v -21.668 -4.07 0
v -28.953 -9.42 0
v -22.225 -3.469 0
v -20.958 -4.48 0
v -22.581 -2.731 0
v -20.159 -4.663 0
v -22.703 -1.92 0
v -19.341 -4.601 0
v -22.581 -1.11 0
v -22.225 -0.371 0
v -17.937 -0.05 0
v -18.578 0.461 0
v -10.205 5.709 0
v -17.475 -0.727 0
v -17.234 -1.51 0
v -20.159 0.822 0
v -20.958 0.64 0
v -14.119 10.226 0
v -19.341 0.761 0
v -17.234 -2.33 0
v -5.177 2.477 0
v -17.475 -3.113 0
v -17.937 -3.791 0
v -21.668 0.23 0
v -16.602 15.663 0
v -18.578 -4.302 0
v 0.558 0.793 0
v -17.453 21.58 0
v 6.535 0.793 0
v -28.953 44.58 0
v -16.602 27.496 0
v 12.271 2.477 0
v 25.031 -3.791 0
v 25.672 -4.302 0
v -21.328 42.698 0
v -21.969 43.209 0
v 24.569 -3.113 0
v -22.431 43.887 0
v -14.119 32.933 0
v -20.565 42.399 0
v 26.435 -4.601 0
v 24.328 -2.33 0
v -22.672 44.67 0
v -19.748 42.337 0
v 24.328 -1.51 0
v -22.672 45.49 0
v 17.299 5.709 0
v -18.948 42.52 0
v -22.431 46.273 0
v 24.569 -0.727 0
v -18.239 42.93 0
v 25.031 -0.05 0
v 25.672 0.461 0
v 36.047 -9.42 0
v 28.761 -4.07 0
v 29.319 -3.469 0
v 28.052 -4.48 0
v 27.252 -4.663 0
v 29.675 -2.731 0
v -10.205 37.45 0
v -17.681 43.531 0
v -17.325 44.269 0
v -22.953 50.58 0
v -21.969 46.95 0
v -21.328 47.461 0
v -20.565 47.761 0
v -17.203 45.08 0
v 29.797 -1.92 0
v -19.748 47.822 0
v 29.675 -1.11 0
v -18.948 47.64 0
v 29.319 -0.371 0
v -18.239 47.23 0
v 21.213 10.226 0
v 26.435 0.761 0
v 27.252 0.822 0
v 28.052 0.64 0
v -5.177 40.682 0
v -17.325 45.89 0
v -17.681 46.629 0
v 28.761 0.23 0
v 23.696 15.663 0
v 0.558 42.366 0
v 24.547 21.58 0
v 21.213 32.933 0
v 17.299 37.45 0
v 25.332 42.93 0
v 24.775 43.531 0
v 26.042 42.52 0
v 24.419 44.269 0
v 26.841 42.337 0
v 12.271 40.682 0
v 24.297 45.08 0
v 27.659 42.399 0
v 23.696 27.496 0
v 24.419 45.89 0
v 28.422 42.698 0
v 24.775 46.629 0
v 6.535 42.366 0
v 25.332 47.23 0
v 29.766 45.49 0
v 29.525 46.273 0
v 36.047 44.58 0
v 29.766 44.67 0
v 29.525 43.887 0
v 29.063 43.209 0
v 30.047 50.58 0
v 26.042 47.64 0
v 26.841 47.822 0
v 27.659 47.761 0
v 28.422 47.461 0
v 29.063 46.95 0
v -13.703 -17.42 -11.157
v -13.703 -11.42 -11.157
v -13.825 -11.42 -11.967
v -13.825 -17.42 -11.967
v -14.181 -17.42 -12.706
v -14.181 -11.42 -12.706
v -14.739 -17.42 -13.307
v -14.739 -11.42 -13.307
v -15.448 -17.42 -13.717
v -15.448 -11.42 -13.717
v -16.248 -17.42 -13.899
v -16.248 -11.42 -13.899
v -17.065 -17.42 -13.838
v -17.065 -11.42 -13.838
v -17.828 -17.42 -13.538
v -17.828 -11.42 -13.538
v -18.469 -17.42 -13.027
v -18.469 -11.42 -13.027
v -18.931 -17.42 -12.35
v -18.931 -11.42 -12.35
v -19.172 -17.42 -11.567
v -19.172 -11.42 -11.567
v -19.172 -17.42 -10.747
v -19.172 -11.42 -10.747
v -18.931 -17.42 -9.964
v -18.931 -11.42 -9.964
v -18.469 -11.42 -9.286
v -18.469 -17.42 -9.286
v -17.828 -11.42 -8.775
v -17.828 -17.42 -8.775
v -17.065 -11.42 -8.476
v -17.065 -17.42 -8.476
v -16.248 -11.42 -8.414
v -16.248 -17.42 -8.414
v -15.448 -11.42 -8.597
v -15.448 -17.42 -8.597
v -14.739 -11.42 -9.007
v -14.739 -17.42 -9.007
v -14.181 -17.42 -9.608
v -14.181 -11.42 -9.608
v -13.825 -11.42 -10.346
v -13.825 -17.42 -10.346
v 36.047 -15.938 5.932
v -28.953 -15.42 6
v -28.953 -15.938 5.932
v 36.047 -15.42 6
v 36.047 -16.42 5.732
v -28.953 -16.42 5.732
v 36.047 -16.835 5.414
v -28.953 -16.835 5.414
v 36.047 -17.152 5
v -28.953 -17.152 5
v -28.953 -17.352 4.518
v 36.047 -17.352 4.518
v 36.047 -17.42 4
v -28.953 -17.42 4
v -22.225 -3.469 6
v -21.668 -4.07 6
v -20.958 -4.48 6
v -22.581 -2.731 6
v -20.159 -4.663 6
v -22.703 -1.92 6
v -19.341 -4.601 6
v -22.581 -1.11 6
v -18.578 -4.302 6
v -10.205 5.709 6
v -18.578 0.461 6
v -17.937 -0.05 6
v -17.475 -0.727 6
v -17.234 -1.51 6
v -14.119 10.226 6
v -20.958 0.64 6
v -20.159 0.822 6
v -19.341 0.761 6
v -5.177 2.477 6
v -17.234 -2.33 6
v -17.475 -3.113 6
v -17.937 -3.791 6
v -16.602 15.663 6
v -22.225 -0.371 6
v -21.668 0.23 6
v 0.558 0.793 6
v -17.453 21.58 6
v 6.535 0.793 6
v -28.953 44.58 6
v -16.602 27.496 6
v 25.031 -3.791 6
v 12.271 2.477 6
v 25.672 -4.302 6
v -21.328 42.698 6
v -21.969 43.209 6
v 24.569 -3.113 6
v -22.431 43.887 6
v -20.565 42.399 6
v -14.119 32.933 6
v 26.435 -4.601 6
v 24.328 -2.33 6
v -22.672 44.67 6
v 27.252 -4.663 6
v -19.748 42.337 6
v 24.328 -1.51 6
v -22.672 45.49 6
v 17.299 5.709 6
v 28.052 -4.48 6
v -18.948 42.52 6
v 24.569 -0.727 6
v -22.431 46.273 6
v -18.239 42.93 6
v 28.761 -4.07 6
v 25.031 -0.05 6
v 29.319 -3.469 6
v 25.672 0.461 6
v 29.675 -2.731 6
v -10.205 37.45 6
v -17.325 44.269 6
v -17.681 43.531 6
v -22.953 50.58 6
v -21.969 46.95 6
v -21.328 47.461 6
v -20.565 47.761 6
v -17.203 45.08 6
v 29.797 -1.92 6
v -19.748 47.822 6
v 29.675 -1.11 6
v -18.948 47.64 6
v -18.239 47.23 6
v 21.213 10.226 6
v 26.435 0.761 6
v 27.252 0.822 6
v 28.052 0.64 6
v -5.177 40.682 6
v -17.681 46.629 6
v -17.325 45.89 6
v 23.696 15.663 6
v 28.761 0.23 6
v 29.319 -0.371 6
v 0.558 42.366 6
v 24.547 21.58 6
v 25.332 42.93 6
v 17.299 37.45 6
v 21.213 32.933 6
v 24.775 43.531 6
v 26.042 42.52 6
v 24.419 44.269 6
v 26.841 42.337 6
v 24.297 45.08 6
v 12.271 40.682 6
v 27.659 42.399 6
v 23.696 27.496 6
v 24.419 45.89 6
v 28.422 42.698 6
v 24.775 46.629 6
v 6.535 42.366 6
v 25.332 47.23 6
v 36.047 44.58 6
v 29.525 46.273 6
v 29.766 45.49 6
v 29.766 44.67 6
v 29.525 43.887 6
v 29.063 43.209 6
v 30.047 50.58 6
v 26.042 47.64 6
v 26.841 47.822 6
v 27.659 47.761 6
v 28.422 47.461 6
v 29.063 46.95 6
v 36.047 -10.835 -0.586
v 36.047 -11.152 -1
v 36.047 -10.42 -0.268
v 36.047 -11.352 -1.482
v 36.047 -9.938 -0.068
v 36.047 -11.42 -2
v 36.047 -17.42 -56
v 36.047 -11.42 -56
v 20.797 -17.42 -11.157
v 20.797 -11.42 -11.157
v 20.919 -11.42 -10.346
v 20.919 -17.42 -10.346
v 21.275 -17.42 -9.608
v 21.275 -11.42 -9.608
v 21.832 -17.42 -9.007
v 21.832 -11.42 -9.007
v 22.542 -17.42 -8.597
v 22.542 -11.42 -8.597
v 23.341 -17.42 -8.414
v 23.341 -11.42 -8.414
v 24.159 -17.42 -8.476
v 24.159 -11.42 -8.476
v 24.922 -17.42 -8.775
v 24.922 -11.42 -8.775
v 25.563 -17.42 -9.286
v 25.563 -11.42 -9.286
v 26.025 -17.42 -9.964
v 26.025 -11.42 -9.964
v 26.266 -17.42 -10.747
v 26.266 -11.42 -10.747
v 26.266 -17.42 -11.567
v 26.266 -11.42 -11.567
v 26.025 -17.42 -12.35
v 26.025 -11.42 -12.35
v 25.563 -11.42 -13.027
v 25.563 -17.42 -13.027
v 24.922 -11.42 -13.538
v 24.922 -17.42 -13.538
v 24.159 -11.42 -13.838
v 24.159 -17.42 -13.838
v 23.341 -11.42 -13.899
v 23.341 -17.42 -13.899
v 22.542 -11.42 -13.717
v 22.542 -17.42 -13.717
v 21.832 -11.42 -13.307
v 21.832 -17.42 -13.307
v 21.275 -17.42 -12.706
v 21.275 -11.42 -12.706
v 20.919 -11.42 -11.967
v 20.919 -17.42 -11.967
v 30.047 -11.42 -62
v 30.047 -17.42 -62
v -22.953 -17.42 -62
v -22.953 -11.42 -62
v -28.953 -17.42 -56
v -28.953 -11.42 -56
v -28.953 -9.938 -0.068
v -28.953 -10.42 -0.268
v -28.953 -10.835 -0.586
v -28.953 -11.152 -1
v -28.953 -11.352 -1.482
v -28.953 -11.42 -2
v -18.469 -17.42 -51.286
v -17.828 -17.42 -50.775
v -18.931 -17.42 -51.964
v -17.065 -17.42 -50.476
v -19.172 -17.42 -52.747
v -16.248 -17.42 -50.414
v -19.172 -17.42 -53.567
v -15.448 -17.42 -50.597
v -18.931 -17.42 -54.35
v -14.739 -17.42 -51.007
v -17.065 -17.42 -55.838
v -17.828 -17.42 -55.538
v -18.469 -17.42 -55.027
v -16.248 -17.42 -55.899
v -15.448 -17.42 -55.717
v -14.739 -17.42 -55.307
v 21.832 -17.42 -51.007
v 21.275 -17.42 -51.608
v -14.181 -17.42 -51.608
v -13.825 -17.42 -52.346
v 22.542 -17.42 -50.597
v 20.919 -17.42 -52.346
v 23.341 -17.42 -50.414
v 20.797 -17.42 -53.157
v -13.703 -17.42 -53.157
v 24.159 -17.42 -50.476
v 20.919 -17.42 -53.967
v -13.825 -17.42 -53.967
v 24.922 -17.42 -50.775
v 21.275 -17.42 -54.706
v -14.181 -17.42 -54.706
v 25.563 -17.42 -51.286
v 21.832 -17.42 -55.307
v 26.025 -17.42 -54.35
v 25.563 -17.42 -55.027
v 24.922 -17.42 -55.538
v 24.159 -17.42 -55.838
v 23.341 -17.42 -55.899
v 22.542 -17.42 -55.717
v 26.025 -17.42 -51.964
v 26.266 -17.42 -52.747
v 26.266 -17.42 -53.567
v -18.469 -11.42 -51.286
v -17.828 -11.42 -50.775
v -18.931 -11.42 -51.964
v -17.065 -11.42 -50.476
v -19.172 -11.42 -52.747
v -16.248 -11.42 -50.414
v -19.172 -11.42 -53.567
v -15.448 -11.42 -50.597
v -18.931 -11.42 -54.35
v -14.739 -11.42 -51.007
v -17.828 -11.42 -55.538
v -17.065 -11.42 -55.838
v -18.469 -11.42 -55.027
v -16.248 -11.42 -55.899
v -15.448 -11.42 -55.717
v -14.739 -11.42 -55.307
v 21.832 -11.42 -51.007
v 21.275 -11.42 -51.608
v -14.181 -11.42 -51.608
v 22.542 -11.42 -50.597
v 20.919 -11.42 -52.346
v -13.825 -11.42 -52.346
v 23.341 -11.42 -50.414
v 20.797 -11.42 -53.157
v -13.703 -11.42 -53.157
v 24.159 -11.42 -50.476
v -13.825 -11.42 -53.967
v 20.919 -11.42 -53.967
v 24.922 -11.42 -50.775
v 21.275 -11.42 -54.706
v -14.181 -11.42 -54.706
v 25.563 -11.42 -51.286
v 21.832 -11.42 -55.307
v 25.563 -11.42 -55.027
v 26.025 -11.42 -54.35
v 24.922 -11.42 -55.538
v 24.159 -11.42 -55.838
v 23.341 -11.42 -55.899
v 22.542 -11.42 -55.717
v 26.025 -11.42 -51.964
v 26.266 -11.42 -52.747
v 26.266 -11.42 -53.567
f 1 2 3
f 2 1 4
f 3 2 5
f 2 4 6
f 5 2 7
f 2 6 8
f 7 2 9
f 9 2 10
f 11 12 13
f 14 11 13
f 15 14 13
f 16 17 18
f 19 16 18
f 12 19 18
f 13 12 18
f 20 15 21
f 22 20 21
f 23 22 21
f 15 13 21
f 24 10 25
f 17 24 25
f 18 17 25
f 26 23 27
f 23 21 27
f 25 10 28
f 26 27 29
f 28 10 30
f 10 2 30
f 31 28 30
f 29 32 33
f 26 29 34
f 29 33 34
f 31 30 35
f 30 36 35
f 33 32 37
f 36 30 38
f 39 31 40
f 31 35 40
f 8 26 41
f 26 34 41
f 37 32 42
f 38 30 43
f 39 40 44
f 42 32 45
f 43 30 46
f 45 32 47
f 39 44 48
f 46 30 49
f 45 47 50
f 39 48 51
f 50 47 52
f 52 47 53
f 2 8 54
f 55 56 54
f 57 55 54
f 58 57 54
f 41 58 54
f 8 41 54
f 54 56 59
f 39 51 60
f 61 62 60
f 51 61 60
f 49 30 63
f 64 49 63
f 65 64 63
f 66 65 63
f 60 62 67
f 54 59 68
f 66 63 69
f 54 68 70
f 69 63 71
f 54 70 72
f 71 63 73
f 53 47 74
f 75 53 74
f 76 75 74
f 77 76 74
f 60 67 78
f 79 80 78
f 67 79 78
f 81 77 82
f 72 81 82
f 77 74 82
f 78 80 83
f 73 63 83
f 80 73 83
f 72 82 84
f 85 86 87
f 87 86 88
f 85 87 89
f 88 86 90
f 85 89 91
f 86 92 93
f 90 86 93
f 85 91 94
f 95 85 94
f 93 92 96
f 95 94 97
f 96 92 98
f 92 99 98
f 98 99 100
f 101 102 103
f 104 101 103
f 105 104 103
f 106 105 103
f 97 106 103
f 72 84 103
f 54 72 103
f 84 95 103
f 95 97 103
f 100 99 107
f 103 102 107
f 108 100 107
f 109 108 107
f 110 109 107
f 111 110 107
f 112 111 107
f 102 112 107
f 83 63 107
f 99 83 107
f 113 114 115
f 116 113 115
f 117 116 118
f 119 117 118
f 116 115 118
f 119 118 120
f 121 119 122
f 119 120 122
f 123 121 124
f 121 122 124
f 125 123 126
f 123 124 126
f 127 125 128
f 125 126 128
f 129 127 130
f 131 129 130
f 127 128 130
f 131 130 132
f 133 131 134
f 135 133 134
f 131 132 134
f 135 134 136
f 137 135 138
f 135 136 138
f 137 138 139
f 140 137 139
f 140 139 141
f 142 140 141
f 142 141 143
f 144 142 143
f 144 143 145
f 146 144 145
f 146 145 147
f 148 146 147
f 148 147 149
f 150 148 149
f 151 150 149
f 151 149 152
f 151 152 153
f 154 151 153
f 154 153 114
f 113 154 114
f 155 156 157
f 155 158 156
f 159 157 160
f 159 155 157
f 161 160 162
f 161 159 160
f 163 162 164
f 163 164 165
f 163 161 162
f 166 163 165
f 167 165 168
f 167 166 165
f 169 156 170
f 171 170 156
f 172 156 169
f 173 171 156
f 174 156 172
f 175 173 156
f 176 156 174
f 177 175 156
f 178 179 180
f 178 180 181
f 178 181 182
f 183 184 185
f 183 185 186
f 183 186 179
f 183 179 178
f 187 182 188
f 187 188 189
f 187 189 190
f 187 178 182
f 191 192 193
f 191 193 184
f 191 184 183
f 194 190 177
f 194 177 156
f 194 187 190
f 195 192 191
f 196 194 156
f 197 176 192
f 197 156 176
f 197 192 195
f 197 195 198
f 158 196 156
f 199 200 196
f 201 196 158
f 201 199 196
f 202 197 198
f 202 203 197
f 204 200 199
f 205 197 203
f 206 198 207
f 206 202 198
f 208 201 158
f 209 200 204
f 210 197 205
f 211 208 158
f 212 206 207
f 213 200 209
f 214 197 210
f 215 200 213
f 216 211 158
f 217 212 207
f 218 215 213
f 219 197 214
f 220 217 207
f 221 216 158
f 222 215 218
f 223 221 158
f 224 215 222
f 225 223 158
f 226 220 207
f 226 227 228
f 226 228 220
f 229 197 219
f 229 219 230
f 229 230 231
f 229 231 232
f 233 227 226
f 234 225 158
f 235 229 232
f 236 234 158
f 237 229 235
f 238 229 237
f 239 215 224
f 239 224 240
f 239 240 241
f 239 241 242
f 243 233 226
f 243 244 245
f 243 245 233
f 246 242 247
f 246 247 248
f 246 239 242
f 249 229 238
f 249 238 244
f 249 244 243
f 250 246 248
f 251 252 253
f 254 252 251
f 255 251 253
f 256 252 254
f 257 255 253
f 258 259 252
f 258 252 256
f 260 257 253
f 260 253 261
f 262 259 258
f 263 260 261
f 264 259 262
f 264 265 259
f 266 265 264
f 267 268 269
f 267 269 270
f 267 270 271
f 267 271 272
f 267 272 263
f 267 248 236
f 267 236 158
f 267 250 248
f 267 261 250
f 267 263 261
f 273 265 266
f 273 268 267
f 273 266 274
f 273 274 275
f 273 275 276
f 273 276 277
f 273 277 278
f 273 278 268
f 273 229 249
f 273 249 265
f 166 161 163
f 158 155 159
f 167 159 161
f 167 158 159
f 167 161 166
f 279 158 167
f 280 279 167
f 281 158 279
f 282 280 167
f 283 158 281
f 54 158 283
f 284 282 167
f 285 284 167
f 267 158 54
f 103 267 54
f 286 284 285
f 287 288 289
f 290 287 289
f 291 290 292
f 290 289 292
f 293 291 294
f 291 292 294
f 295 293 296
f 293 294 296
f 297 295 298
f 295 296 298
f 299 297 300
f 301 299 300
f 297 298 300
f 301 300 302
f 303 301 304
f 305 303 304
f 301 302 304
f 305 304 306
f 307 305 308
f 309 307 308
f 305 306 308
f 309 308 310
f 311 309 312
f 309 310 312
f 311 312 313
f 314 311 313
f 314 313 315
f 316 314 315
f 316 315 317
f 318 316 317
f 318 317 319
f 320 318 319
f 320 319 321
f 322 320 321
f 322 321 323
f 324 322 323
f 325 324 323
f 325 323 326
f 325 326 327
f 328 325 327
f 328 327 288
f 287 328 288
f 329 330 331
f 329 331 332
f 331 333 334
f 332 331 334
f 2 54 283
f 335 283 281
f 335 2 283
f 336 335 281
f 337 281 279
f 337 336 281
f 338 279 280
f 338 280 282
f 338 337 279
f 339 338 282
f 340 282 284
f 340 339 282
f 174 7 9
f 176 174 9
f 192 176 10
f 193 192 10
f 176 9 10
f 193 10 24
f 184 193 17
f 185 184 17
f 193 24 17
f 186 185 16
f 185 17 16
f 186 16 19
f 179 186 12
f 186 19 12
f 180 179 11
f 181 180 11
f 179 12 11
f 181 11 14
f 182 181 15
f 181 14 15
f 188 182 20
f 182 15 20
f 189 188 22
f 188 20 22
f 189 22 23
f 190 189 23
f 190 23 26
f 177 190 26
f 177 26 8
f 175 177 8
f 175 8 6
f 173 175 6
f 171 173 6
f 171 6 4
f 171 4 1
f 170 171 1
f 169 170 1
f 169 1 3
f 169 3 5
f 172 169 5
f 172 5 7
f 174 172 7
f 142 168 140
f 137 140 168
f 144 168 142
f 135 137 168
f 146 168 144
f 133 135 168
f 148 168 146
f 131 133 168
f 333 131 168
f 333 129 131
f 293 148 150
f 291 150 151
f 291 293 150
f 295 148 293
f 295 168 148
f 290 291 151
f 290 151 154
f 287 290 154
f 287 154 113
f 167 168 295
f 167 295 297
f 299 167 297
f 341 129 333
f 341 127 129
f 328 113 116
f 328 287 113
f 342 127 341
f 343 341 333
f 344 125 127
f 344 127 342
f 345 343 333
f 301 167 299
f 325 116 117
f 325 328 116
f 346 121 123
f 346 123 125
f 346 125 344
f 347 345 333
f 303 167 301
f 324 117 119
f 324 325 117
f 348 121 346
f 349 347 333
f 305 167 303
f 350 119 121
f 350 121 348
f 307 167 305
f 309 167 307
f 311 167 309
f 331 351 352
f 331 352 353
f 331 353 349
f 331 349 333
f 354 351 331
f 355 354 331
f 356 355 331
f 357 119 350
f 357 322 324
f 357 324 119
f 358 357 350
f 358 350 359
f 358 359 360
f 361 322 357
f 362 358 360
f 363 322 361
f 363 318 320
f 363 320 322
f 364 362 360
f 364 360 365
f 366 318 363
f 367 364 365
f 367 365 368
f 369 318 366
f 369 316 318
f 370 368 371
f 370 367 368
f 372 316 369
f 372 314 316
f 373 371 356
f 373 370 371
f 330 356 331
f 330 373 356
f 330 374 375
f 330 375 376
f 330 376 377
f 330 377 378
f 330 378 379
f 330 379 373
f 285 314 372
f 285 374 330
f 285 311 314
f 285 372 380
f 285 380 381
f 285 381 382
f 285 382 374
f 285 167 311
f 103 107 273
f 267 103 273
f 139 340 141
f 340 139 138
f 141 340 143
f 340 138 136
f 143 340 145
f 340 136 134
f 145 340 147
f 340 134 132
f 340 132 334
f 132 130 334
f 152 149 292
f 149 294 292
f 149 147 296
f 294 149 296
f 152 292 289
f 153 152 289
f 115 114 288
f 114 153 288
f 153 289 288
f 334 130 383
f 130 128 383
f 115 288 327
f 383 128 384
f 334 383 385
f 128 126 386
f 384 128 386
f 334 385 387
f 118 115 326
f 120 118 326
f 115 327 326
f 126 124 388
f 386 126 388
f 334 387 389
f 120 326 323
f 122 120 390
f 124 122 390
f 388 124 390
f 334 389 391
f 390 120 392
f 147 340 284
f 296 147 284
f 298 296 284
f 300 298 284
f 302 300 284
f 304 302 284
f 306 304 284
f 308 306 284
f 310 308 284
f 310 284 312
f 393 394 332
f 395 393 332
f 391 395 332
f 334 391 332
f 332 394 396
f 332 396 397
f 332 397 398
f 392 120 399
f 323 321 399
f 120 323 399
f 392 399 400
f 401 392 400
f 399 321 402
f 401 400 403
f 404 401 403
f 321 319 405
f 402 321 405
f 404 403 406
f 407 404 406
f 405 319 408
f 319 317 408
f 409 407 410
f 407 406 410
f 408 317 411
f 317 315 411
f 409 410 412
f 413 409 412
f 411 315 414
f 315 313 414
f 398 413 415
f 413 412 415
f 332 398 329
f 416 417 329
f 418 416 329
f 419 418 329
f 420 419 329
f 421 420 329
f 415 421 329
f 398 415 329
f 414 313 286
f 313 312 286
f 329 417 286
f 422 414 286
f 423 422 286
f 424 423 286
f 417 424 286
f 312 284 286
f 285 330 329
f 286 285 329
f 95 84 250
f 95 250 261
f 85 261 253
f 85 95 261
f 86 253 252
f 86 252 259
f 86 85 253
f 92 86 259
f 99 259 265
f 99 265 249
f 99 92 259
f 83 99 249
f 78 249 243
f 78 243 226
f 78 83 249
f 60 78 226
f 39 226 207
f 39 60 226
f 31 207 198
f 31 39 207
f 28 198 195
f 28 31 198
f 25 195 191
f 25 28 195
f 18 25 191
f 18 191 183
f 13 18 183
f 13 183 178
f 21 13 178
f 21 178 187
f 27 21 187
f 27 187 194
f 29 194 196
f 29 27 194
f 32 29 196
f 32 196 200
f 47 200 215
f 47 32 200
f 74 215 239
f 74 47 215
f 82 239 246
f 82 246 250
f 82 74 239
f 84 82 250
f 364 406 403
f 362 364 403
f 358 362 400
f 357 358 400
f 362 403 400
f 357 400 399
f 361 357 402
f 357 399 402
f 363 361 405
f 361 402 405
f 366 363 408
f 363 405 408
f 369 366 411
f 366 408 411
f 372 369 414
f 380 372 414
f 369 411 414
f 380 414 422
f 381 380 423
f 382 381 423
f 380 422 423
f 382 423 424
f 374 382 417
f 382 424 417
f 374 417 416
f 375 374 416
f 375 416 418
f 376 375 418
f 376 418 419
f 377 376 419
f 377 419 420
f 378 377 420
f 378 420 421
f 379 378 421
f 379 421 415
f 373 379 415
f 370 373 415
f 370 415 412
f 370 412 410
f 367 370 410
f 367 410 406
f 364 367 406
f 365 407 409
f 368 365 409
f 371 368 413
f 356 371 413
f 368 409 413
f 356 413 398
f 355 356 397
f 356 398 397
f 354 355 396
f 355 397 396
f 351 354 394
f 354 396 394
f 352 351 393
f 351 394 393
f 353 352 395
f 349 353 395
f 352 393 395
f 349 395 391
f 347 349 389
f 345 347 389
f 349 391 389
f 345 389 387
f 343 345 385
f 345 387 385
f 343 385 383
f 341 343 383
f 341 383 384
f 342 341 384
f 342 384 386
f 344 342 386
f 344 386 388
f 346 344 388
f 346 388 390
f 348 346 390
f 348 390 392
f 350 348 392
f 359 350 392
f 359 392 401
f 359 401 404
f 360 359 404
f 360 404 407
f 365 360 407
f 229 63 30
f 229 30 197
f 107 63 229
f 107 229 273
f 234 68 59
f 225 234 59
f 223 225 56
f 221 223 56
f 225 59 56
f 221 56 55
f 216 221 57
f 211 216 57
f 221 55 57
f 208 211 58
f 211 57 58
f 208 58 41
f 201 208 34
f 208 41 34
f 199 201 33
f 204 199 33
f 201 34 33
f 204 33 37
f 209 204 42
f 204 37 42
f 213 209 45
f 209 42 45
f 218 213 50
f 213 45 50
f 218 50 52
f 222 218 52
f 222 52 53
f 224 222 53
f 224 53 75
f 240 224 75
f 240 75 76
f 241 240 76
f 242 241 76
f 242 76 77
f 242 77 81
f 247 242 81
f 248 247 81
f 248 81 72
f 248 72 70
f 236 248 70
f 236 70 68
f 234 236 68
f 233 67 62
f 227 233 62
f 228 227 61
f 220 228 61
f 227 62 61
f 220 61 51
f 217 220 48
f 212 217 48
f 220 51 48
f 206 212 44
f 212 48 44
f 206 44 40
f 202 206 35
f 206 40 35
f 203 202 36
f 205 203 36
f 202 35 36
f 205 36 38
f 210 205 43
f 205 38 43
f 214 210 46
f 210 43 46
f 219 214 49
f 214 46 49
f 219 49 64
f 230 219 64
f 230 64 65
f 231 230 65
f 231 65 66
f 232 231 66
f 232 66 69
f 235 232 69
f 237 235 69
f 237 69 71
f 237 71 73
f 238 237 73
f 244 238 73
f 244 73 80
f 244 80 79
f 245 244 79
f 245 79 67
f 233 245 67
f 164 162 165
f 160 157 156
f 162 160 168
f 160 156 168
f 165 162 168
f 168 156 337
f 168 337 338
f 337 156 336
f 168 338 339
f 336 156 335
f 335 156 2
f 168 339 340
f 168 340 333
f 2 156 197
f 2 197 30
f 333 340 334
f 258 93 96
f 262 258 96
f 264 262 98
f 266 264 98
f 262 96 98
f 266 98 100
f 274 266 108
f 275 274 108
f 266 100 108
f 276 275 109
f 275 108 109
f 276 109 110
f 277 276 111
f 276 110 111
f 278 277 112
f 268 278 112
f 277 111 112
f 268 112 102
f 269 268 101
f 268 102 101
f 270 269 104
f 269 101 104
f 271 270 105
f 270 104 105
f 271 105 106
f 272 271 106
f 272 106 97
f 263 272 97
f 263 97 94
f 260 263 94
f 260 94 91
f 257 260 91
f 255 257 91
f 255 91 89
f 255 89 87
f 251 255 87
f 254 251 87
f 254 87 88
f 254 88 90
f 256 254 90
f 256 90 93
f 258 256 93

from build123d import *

# Parameters (mm, degrees)
SKETCH_1_W          = 65
SKETCH_1_H          = 68
SKETCH_1_R          = 21
EXTRUDE_1_DEPTH     = 6
SKETCH_3_W          = 62
SKETCH_3_H          = 6
EXTRUDE_2_DEPTH     = 65
CHAMFER_2_SIZE      = 6
CHAMFER_3_SIZE      = 6
CHAMFER_4_SIZE      = 6
CHAMFER_5_SIZE      = 6
FILLET_1_R          = 2
FILLET_2_R          = 2
SKETCH_5_R          = 2.75
CUT_EXTRUDE_3_DEPTH = 88.759227349
SKETCH_6_R          = 2.75
CUT_EXTRUDE_4_DEPTH = 95.80177845


with BuildPart() as part:
    # 草图1 → 凸台-拉伸1 (new body)
    with BuildSketch(Plane.XY):
        with Locations((3.546875, 16.5796875)):
            Rectangle(SKETCH_1_W, SKETCH_1_H)
        with Locations((3.546875, 21.5796875)):
            Circle(SKETCH_1_R, mode=Mode.SUBTRACT)
    extrude(amount=EXTRUDE_1_DEPTH)

    # 草图3 → 凸台-拉伸2 (add)
    with BuildSketch(Plane(origin=(36.046875, 0, 0), x_dir=(0, 0, -1), z_dir=(1, 0, 0))):
        with Locations((31, -14.4203125)):
            Rectangle(SKETCH_3_W, SKETCH_3_H)
    extrude(amount=-EXTRUDE_2_DEPTH)

    # 倒角2
    chamfer_2_edges = [part.edges().sort_by_distance(p)[0] for p in [
        (36.046875, -14.4203125, -62),
    ]]
    chamfer(chamfer_2_edges, length=CHAMFER_2_SIZE)

    # 倒角3
    chamfer_3_edges = [part.edges().sort_by_distance(p)[0] for p in [
        (-28.953125, -14.4203125, -62),
    ]]
    chamfer(chamfer_3_edges, length=CHAMFER_3_SIZE)

    # 倒角4
    chamfer_4_edges = [part.edges().sort_by_distance(p)[0] for p in [
        (-28.953125, 50.5796875, 3),
    ]]
    chamfer(chamfer_4_edges, length=CHAMFER_4_SIZE)

    # 倒角5
    chamfer_5_edges = [part.edges().sort_by_distance(p)[0] for p in [
        (36.046875, 50.5796875, 3),
    ]]
    chamfer(chamfer_5_edges, length=CHAMFER_5_SIZE)

    # 圆角1
    fillet_1_edges = [part.edges().sort_by_distance(p)[0] for p in [
        (3.546875, -17.4203125, 6),
    ]]
    fillet(fillet_1_edges, radius=FILLET_1_R)

    # 圆角2
    fillet_2_edges = [part.edges().sort_by_distance(p)[0] for p in [
        (3.546875, -11.4203125, 0),
    ]]
    fillet(fillet_2_edges, radius=FILLET_2_R)

    # 草图5 → 切除-拉伸3 (cut, through all)
    with BuildSketch(Plane(origin=(0, 0, 0), x_dir=(-1, 0, 0), z_dir=(0, 0, -1))):
        with Locations((-27.046875, 45.0796875)):
            Circle(SKETCH_5_R)
        with Locations((19.953125, 45.0796875)):
            Circle(SKETCH_5_R)
        with Locations((19.953125, -1.9203125)):
            Circle(SKETCH_5_R)
        with Locations((-27.046875, -1.9203125)):
            Circle(SKETCH_5_R)
    extrude(amount=-CUT_EXTRUDE_3_DEPTH, mode=Mode.SUBTRACT)

    # 草图6 → 切除-拉伸4 (cut, through all)
    with BuildSketch(Plane(origin=(0, -11.4203125, 0), x_dir=(1, 0, 0), z_dir=(0, 1, 0))):
        with Locations((23.546875, 11.156752463)):
            Circle(SKETCH_6_R)
        with Locations((23.546875, 53.156752463)):
            Circle(SKETCH_6_R)
        with Locations((-16.453125, 53.156752463)):
            Circle(SKETCH_6_R)
        with Locations((-16.453125, 11.156752463)):
            Circle(SKETCH_6_R)
    extrude(amount=-CUT_EXTRUDE_4_DEPTH, mode=Mode.SUBTRACT)


solid = part.part
